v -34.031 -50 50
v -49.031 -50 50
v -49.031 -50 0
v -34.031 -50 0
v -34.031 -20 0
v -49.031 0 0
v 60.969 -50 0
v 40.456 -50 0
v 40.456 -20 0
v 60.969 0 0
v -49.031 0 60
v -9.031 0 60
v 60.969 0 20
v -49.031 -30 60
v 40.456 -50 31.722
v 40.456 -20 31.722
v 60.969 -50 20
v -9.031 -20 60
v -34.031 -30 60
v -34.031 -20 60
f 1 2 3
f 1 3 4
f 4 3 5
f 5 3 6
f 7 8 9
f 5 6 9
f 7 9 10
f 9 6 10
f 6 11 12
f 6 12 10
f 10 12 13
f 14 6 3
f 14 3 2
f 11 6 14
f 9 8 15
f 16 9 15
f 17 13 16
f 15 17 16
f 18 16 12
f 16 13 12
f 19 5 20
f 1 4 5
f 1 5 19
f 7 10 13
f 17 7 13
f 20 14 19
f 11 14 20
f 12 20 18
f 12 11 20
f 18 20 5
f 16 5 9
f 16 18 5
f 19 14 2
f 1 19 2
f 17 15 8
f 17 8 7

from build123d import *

# Parameters (mm, degrees)
F0_W     = 110
F0_H     = 60
F1_DEPTH = 50
F2_W     = 74.486891
F2_H     = 60
F3_DEPTH = 30
F5_DEPTH = 15
F7_DEPTH = 50


with BuildPart() as f1:
    # F0 (on Front) → F1 (new body)
    with BuildSketch(Plane.XZ):
        with Locations((5.968994, 30)):
            Rectangle(F0_W, F0_H)
    extrude(amount=F1_DEPTH)

    # F2 (on face) → F3 (cut)
    with BuildSketch(Plane.XZ.offset(50)):
        with Locations((3.212439, 30)):
            Rectangle(F2_W, F2_H)
    extrude(amount=-F3_DEPTH, mode=Mode.SUBTRACT)

    # F4 (on face) → F5 (cut)
    with BuildSketch(Plane(origin=(-49.031006, 0, 0), x_dir=(0, -1, 0), z_dir=(-1, 0, 0))):
        Polygon((50, 60), (30, 60), (50, 50), align=None)
    extrude(amount=-F5_DEPTH, mode=Mode.SUBTRACT)

    # F6 (on face) → F7 (cut)
    with BuildSketch(Plane(origin=(0, 0, 0), x_dir=(-1, 0, 0), z_dir=(0, 1, 0))):
        Polygon((-60.968994, 20), (9.031006, 60), (-60.968994, 60), align=None)
    extrude(amount=-F7_DEPTH, mode=Mode.SUBTRACT)


solid = f1.part
